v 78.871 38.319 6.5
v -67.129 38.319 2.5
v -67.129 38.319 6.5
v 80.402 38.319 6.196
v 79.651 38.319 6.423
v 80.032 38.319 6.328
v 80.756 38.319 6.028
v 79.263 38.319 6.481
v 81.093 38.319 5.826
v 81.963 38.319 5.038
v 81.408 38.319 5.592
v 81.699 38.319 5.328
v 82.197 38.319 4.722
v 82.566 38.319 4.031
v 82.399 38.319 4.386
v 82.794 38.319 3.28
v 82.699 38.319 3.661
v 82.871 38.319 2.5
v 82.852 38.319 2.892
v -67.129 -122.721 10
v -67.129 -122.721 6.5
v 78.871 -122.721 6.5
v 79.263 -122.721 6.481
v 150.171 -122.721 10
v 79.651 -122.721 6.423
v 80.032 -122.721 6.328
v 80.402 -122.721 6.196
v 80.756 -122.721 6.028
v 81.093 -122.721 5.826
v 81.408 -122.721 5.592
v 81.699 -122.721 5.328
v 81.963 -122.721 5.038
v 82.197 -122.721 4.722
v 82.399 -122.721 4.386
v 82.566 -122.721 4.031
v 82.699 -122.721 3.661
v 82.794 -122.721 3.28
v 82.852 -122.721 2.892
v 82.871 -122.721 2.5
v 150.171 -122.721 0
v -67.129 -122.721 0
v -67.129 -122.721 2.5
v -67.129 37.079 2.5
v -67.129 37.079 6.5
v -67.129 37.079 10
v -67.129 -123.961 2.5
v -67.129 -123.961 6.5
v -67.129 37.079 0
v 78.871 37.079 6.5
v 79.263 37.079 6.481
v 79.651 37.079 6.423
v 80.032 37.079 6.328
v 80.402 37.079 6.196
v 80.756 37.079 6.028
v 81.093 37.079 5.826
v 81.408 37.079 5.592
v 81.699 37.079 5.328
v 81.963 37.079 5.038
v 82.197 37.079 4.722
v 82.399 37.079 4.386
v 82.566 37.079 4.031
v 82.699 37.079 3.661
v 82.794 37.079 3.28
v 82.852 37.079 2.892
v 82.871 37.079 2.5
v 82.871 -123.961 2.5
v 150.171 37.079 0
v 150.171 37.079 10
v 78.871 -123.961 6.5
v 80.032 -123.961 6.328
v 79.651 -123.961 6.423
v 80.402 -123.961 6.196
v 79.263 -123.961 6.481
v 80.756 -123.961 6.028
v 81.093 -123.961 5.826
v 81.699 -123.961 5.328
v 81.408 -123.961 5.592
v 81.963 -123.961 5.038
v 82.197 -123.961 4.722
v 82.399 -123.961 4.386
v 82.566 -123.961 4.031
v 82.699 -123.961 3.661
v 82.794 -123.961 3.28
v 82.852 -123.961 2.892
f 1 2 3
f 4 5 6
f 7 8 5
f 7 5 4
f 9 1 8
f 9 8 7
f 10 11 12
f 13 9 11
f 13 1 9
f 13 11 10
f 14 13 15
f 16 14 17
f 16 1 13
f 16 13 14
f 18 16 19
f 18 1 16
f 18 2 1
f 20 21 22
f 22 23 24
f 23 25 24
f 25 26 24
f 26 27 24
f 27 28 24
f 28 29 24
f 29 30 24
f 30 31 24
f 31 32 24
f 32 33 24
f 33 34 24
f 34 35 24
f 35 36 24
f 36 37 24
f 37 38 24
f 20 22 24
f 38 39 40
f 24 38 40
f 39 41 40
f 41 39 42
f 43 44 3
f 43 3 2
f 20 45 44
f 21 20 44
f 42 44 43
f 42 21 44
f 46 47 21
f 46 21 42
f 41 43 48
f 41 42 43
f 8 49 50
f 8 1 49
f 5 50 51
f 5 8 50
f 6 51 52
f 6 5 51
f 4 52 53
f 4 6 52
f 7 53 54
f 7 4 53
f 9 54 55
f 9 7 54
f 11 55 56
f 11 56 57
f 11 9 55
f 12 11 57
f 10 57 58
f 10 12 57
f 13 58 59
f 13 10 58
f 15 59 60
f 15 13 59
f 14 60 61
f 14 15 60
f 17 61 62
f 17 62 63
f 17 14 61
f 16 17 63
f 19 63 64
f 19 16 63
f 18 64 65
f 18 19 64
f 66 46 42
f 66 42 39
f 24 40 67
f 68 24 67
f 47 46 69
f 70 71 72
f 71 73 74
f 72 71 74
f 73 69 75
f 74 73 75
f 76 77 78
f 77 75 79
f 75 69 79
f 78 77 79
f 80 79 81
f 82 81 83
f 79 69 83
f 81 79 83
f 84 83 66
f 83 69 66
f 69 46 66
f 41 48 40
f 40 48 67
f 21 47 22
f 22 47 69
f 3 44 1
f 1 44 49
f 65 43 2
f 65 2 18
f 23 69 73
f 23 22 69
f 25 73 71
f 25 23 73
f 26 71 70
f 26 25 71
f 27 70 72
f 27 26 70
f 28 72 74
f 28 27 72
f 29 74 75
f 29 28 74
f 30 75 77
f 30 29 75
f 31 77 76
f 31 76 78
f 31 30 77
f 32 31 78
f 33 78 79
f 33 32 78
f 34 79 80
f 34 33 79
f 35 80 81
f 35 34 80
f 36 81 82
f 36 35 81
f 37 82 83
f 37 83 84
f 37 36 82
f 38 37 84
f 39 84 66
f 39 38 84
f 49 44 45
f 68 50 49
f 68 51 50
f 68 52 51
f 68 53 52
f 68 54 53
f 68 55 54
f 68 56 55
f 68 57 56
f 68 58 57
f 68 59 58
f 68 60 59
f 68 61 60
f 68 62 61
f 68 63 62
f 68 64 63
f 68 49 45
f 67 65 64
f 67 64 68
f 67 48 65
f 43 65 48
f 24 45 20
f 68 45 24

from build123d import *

# Parameters (mm, degrees)
ESBO_O1_W                     = 217.3
ESBO_O1_H                     = 159.8
RESSALTO_EXTRUS_O1_DEPTH      = 10
RESSALTO_EXTRUS_O2_DEPTH      = 1.24
RESSALTO_EXTRUS_O2_DEPTH_BACK = 161.04
ESBO_O2_W                     = 150
ESBO_O2_H                     = 4
FILETE1_R                     = 4
FILETE2_R                     = 4


with BuildPart() as part:
    # Esboço1 → Ressalto-extrusão1 (new body)
    with BuildSketch(Plane.XY):
        with Locations((41.520834075, -42.82072758)):
            Rectangle(ESBO_O1_W, ESBO_O1_H)
    extrude(amount=RESSALTO_EXTRUS_O1_DEPTH)

    # Esboço2 → Ressalto-extrusão2 (add, two sides: drawn at the far end of the back side and taken through both)
    with BuildSketch(Plane(origin=(0, 37.07927242, 0), x_dir=(1, 0, 0), z_dir=(0, 1, 0)).offset(-RESSALTO_EXTRUS_O2_DEPTH_BACK)):
        with Locations((7.870834075, -4.5)):
            Rectangle(ESBO_O2_W, ESBO_O2_H)
    extrude(amount=RESSALTO_EXTRUS_O2_DEPTH + RESSALTO_EXTRUS_O2_DEPTH_BACK)

    # Filete1
    filete1_edges = [part.edges().sort_by_distance(p)[0] for p in [
        (82.870834075, -123.34072758, 6.5),
    ]]
    fillet(filete1_edges, radius=FILETE1_R - 0.0001)  # a hair under: the kernel refuses the full size

    # Filete2
    filete2_edges = [part.edges().sort_by_distance(p)[0] for p in [
        (82.870834075, 37.69927242, 6.5),
    ]]
    fillet(filete2_edges, radius=FILETE2_R - 0.0001)  # a hair under: the kernel refuses the full size


solid = part.part
